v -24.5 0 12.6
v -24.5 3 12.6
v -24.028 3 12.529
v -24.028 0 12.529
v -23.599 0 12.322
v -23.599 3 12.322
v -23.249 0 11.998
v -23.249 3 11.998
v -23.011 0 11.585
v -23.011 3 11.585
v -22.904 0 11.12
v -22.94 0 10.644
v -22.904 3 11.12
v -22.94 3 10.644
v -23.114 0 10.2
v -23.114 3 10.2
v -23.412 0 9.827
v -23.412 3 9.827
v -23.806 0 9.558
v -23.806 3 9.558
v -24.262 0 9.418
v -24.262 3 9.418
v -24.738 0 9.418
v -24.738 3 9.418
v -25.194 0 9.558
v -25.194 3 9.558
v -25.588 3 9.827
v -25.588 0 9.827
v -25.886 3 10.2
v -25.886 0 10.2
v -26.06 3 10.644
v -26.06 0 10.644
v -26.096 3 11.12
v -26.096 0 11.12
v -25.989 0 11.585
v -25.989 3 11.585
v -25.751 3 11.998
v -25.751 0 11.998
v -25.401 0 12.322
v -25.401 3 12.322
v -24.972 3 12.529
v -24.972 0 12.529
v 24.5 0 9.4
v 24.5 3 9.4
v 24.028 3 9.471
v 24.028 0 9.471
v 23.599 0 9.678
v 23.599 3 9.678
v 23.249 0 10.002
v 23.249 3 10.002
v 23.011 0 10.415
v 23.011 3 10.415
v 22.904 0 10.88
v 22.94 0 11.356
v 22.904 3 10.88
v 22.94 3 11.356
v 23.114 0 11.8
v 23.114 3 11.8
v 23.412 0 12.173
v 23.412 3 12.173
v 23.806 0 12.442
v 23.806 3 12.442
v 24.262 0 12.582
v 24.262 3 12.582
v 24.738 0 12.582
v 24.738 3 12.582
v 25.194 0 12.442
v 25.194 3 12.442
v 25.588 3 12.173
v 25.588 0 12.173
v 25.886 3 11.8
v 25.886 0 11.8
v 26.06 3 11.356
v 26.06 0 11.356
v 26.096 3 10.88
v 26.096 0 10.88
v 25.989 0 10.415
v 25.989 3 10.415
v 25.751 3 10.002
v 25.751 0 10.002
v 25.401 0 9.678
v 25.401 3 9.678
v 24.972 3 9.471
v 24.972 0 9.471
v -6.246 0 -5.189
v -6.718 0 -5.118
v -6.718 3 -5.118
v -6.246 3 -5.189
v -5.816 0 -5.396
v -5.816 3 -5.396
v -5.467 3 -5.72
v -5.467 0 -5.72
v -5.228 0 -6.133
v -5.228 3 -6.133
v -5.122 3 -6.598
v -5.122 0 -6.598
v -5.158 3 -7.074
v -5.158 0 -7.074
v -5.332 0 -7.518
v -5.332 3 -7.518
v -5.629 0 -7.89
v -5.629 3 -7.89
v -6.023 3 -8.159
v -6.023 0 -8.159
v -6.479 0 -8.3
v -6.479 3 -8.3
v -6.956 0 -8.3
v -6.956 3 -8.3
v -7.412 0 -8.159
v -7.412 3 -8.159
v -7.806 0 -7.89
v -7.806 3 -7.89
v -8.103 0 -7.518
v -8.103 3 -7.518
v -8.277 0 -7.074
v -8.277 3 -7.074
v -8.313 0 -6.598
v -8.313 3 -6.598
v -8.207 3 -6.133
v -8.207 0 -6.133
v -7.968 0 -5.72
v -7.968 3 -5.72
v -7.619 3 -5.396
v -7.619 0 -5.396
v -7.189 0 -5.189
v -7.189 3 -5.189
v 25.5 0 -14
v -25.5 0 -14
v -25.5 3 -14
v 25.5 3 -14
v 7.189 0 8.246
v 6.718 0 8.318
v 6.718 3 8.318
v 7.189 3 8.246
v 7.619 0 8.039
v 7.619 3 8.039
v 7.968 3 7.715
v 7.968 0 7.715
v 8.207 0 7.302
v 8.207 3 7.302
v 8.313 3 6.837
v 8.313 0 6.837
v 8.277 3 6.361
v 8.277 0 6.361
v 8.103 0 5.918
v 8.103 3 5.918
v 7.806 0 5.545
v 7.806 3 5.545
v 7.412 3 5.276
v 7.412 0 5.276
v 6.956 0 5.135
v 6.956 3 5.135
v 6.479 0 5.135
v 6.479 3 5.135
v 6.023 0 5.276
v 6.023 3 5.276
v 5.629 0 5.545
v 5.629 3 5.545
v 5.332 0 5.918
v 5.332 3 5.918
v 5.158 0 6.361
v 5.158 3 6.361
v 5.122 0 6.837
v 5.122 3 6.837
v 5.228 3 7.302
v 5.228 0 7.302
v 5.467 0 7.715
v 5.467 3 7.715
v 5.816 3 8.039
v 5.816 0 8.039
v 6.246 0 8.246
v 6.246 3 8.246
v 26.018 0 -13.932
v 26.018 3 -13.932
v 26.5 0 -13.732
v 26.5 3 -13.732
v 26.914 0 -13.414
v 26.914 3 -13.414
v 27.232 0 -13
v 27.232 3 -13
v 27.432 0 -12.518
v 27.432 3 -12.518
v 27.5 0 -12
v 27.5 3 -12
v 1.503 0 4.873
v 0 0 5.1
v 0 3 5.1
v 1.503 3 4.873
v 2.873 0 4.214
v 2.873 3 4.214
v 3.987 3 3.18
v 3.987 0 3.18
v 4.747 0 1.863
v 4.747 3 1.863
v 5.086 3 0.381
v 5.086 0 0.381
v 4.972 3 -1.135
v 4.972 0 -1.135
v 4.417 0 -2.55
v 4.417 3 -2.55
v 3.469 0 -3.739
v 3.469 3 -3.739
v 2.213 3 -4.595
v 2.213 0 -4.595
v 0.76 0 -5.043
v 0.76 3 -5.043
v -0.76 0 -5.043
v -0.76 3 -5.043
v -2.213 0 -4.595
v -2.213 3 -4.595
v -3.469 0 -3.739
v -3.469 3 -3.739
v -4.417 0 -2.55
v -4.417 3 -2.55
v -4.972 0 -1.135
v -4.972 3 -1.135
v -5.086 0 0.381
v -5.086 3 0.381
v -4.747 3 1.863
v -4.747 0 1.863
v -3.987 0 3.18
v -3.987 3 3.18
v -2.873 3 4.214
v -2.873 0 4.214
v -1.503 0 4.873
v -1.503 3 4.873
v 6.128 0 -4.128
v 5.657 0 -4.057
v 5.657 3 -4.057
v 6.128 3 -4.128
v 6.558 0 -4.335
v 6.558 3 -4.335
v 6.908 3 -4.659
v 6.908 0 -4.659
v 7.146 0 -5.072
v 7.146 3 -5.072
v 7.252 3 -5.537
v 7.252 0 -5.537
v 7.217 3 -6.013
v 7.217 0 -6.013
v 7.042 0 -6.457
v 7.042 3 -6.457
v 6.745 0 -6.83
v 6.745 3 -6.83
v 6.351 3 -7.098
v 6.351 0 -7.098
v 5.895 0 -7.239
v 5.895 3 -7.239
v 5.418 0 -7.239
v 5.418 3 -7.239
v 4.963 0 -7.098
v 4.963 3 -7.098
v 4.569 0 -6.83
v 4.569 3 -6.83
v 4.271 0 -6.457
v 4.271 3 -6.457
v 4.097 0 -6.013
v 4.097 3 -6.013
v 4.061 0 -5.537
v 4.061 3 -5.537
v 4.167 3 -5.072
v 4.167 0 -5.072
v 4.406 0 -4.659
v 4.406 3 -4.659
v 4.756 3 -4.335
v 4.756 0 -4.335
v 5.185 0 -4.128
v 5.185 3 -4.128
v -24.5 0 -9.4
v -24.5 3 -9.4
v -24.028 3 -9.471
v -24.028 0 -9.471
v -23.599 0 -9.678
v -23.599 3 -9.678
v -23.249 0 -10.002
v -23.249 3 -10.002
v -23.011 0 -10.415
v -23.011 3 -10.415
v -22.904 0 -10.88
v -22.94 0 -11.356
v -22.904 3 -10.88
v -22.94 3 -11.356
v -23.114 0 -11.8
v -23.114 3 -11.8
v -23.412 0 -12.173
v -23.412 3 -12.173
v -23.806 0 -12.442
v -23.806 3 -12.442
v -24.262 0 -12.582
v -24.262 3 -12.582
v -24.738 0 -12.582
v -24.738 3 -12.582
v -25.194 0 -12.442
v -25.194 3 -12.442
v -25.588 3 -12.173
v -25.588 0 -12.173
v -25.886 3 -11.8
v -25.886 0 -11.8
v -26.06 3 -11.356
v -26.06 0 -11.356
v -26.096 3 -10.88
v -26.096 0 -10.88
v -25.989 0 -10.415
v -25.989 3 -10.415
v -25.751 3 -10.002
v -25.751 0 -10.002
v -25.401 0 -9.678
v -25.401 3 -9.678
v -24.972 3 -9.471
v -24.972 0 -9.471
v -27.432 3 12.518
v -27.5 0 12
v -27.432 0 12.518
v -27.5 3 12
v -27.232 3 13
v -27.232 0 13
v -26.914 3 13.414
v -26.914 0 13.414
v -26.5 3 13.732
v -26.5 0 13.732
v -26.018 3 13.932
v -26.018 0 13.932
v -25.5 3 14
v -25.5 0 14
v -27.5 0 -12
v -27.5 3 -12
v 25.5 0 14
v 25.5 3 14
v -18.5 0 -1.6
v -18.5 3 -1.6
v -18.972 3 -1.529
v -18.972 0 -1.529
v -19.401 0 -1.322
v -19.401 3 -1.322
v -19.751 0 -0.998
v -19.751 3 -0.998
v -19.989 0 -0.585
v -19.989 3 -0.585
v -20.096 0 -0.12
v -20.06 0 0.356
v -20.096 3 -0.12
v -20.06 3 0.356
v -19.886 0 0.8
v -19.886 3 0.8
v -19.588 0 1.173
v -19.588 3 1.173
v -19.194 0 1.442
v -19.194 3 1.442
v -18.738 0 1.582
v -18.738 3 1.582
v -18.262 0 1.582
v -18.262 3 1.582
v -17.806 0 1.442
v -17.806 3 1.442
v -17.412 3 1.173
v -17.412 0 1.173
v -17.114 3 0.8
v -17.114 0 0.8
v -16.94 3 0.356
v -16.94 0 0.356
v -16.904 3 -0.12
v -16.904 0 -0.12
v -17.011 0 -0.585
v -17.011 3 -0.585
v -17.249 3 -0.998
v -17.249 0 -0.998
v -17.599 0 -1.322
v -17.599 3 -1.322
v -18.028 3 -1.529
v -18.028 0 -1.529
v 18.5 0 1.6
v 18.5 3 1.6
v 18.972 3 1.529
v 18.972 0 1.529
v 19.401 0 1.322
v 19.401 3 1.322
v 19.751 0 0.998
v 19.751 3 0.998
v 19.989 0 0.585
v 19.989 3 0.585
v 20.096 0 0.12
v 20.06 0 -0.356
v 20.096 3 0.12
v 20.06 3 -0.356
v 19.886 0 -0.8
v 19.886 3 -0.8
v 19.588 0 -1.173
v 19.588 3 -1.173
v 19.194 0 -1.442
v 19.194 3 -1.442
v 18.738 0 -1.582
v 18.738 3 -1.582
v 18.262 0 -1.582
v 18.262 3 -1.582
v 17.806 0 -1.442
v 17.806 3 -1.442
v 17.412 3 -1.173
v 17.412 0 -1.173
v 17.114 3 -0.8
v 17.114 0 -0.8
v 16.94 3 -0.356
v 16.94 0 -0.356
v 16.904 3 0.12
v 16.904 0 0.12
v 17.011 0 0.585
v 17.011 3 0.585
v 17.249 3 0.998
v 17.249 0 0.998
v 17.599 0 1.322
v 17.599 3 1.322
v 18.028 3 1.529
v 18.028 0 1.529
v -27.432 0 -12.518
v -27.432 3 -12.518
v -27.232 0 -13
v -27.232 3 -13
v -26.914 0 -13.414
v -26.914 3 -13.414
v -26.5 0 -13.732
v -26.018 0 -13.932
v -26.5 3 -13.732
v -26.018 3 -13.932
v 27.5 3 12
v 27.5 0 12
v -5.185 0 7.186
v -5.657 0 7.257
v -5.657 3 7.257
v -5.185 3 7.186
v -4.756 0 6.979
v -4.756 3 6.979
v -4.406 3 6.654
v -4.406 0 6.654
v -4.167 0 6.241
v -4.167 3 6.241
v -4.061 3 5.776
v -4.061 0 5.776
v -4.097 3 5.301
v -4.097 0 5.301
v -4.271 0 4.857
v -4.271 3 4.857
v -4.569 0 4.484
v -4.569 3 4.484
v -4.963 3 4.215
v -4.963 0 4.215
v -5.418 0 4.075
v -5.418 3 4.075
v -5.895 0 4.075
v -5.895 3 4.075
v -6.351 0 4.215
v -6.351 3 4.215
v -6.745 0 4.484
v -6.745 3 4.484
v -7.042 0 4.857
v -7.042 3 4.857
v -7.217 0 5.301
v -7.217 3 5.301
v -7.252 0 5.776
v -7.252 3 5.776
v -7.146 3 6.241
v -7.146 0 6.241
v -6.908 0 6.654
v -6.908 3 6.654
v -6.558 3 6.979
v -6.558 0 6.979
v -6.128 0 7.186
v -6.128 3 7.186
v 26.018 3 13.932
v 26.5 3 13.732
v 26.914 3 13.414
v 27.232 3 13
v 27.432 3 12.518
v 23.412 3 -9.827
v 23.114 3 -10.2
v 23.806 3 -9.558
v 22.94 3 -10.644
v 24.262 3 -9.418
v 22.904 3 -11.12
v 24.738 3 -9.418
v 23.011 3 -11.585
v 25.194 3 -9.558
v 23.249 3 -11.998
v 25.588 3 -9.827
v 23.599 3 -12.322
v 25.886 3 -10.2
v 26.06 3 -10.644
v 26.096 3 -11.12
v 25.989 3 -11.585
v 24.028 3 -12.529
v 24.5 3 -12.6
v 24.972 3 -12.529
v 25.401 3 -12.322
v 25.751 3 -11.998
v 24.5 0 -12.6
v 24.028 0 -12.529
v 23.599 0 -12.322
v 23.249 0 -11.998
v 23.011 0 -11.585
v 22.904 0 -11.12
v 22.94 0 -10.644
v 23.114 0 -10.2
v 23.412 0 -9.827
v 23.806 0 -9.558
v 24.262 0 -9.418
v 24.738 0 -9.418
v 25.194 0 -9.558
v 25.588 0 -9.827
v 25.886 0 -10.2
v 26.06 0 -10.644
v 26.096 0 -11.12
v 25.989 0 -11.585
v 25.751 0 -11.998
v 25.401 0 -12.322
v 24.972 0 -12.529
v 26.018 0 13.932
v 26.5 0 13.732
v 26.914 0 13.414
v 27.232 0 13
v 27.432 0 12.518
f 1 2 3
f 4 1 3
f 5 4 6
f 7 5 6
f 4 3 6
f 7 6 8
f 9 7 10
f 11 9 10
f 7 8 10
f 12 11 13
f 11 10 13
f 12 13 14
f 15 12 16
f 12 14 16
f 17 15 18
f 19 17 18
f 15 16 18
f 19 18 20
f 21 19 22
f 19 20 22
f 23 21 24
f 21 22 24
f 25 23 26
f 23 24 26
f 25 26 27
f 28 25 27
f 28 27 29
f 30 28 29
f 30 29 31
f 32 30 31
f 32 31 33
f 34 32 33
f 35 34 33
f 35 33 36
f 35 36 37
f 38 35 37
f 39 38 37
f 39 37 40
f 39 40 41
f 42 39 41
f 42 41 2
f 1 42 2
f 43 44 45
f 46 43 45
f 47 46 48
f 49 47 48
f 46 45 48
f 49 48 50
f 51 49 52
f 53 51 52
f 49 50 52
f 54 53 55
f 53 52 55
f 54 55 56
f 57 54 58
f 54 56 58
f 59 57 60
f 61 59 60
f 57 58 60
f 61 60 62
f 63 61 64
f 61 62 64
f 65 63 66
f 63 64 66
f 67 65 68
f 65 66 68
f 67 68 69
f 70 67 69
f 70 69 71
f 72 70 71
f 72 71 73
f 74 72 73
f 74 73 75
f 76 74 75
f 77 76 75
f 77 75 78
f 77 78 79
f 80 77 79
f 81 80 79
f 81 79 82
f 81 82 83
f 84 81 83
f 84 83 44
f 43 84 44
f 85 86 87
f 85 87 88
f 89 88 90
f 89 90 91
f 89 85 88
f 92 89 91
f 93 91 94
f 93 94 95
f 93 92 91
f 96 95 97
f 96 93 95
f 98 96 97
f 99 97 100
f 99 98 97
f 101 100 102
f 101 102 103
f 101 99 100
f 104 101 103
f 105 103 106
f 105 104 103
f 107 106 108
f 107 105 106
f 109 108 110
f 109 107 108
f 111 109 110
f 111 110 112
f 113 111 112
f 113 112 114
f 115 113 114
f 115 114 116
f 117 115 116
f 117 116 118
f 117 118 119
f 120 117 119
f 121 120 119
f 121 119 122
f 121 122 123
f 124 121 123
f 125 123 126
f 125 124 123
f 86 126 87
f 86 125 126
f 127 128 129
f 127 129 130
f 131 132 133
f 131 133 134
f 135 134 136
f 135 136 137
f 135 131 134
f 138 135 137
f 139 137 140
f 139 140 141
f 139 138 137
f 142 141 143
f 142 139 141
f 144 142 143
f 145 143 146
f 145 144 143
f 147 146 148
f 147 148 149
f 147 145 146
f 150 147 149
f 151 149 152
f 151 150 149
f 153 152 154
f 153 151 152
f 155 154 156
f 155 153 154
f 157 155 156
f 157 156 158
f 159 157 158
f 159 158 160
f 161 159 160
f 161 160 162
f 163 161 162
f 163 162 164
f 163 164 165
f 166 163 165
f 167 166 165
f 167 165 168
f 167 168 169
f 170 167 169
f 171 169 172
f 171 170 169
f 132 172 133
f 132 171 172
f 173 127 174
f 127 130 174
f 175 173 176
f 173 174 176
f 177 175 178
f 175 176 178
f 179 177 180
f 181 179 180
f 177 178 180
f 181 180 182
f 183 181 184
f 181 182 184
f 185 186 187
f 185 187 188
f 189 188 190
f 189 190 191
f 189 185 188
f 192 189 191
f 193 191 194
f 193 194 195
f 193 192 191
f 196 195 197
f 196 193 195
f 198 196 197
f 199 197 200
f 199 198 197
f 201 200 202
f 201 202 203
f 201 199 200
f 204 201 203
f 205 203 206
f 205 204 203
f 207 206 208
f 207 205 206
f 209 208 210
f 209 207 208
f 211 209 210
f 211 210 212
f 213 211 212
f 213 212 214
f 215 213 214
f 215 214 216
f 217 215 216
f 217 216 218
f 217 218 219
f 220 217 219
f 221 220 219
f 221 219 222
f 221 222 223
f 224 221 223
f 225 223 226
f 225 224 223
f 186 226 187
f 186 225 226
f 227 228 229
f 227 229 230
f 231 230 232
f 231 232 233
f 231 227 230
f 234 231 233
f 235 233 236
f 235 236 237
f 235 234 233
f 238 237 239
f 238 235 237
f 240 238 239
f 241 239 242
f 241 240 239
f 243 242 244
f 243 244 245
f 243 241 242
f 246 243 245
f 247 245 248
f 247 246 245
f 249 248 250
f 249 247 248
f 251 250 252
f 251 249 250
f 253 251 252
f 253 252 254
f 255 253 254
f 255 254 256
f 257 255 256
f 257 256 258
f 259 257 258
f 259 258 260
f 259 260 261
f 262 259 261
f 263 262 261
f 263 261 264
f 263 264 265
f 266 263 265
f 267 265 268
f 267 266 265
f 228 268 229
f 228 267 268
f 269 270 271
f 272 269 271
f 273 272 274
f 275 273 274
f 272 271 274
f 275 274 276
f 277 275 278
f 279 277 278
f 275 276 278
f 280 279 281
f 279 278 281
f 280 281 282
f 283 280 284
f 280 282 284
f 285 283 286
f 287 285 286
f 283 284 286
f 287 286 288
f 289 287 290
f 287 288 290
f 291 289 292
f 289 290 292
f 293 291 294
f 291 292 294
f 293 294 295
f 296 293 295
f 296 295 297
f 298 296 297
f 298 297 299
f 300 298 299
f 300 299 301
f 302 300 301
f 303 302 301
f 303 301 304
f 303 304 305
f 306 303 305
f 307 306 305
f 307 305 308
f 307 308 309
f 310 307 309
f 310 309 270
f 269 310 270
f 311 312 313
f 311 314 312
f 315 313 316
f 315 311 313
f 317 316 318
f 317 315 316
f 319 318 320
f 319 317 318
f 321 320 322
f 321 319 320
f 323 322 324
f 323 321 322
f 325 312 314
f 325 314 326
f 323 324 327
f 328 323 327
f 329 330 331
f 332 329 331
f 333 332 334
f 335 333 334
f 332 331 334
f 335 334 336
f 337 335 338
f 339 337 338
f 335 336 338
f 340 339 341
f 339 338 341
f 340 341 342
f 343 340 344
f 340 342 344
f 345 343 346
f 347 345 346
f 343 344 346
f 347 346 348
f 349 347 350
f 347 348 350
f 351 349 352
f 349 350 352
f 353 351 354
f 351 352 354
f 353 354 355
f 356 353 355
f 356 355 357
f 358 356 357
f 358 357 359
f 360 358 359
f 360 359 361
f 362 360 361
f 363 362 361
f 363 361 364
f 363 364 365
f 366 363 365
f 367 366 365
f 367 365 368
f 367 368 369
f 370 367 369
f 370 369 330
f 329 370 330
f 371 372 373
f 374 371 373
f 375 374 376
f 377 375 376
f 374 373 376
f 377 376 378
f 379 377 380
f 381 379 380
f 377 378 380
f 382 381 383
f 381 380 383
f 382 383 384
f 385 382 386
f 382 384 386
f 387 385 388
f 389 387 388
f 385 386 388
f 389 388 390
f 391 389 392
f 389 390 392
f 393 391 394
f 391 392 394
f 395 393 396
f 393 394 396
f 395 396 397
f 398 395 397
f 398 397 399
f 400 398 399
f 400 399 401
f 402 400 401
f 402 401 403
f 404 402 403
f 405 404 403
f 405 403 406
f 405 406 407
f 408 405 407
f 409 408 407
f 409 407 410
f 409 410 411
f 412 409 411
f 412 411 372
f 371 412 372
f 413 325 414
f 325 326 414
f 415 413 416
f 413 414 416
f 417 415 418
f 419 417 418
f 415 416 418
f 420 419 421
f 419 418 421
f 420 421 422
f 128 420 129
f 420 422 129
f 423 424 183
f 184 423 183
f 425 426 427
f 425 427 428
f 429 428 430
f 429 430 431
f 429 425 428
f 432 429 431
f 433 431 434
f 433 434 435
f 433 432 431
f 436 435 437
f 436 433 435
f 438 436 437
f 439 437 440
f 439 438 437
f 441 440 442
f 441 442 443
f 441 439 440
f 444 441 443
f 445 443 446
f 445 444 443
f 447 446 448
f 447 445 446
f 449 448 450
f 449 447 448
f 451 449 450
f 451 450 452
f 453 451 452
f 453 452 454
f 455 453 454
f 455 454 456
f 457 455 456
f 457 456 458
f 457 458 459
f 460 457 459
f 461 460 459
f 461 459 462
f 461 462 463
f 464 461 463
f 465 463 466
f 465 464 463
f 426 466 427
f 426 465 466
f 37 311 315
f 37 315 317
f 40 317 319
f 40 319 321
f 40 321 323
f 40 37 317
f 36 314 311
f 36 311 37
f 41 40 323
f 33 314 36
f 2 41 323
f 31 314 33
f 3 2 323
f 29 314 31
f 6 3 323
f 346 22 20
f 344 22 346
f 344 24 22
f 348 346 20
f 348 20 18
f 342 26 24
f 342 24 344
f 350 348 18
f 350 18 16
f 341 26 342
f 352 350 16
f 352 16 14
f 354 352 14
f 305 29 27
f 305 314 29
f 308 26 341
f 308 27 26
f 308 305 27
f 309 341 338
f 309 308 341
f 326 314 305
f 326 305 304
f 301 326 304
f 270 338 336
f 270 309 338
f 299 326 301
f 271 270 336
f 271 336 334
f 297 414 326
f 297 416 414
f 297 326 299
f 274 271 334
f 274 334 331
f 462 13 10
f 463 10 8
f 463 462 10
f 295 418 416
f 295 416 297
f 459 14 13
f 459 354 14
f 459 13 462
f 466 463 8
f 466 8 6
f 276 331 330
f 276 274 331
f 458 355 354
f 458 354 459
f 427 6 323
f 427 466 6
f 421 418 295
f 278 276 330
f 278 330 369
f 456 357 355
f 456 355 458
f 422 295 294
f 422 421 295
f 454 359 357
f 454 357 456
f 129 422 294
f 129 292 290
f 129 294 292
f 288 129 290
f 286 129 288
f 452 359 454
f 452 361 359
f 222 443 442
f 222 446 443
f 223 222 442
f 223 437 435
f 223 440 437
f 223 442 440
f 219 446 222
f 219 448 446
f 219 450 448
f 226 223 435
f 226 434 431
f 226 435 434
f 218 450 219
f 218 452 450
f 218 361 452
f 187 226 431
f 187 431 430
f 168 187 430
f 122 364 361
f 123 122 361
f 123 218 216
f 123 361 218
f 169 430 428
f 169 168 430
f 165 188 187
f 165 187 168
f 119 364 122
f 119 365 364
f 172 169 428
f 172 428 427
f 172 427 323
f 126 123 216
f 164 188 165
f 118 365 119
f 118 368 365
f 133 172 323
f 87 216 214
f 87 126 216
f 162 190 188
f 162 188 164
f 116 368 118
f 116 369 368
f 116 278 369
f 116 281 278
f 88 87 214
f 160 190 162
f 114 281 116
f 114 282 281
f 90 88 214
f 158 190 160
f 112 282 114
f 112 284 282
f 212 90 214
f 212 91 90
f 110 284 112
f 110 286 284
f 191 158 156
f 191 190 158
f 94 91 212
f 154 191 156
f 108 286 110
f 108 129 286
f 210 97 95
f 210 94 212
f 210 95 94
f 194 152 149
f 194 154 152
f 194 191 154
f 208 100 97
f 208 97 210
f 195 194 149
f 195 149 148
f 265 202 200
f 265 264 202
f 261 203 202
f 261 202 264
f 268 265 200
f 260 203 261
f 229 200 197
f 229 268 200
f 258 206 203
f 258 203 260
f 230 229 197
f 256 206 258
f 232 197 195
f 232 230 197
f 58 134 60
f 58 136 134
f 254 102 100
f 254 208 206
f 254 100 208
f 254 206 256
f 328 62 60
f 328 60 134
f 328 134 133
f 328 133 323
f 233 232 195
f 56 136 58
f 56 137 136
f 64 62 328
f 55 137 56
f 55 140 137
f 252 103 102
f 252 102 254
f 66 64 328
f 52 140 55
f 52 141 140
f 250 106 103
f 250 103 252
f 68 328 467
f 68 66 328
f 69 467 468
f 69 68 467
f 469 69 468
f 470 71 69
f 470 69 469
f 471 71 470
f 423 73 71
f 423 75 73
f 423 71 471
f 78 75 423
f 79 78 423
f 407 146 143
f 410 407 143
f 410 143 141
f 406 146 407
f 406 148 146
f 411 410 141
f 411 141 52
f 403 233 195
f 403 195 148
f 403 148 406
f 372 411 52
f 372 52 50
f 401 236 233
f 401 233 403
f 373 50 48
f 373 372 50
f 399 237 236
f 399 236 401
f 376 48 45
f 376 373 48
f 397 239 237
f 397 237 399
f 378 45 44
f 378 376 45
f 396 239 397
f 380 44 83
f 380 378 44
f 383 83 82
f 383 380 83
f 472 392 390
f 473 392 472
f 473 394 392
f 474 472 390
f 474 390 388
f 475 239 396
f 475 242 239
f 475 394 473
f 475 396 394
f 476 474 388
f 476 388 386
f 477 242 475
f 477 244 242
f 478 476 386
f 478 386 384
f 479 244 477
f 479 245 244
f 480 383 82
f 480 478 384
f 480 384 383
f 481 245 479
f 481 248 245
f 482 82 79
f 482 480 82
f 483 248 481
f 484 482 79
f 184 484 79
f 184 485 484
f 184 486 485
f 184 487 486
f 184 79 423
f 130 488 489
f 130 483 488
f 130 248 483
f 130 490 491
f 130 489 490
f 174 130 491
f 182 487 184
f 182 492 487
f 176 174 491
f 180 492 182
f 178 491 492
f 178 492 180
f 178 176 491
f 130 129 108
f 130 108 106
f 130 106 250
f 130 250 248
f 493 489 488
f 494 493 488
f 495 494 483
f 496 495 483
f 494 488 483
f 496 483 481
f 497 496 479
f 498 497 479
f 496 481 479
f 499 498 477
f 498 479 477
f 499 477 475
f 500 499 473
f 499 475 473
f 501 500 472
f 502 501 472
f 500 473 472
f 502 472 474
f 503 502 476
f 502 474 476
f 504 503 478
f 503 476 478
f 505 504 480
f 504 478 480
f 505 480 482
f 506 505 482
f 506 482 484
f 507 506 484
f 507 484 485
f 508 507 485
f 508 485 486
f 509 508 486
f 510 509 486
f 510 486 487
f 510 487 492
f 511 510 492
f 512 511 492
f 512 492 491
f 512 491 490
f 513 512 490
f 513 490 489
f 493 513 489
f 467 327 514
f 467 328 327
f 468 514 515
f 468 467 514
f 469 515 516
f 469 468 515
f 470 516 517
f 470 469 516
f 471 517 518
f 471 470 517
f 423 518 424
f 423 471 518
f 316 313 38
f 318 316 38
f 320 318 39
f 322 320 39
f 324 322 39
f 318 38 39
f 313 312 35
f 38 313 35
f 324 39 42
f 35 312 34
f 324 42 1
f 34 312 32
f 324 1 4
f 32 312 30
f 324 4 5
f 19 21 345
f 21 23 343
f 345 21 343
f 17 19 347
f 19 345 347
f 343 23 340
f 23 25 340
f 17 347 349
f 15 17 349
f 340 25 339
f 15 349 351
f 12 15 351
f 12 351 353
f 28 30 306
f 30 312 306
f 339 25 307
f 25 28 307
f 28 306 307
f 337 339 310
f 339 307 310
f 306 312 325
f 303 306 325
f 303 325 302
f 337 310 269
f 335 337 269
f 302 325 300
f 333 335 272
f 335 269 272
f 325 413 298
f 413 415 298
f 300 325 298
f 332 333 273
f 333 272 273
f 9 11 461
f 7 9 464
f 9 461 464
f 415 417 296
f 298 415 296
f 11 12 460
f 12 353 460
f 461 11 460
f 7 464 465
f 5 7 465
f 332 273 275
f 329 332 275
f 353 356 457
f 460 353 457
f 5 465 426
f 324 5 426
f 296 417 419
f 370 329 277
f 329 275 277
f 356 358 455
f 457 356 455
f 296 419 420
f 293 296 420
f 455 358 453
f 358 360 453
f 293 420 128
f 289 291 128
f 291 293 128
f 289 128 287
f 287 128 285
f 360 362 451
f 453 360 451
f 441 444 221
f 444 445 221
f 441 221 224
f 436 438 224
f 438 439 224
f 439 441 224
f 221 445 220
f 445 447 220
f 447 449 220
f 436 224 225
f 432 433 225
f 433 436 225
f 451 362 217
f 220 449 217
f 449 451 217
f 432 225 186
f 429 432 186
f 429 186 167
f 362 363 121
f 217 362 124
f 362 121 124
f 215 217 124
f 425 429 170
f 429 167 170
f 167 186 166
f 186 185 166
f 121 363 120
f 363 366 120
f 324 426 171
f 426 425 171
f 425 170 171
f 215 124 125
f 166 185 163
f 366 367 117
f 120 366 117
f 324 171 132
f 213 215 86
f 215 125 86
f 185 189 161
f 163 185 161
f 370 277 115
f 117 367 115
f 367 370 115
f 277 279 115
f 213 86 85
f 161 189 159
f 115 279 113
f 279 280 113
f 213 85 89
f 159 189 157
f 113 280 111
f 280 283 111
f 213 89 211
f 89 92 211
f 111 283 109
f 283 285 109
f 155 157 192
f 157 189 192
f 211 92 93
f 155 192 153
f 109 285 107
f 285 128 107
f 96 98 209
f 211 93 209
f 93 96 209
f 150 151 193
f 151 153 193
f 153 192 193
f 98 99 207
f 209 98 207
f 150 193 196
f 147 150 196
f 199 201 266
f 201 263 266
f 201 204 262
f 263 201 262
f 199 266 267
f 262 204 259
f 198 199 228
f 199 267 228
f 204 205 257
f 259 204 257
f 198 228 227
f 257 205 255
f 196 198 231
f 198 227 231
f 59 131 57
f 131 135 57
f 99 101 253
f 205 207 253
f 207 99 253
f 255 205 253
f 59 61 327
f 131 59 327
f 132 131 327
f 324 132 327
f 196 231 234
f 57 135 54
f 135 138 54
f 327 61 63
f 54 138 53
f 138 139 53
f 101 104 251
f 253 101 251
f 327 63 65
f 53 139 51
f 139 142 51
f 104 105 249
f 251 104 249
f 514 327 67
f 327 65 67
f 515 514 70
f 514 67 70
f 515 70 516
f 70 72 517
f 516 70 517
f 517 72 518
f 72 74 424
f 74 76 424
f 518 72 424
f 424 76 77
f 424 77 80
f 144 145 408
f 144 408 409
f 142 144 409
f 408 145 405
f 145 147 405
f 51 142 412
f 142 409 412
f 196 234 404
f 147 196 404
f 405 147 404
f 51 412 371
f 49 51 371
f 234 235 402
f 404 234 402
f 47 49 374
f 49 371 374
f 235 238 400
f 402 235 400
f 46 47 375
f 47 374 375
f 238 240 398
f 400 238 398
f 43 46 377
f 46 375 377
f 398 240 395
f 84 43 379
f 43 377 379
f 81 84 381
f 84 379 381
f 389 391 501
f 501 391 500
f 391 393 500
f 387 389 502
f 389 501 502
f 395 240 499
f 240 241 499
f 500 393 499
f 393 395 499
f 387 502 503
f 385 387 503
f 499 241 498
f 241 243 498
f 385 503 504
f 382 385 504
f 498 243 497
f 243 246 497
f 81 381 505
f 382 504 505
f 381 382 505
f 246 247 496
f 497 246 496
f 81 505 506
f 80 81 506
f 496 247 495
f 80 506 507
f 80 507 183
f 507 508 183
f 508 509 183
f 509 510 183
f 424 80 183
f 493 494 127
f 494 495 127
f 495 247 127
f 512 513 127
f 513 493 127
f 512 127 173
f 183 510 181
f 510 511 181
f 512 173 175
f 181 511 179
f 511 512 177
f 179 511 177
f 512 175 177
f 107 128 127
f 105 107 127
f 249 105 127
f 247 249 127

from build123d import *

# Parameters (mm, degrees)
SKETCH_1_W          = 55
SKETCH_1_H          = 28
SKETCH_1_R          = 5.1
SKETCH_1_R_2        = 1.6
EXTRUDE_1_DEPTH     = 3
SKETCH_2_R          = 1.6
CUT_EXTRUDE_1_DEPTH = 32.004031996
FILLET_1_R          = 2


with BuildPart() as part:
    # 草图1 → 凸台-拉伸1 (new body)
    with BuildSketch(Plane(origin=(0, 0, 0), x_dir=(1, 0, 0), z_dir=(0, 1, 0))):
        Rectangle(SKETCH_1_W, SKETCH_1_H)
        with Locations(Location((0, 0, 0), (0, 0, 270))):
            Circle(SKETCH_1_R, mode=Mode.SUBTRACT)
        with Locations(Location((5.656854249, 5.656854249, 0), (0, 0, 270))):
            Circle(SKETCH_1_R_2, mode=Mode.SUBTRACT)
        with Locations(Location((-5.656854249, -5.656854249, 0), (0, 0, 270))):
            Circle(SKETCH_1_R_2, mode=Mode.SUBTRACT)
        with Locations(Location((6.717514421, -6.717514421, 0), (0, 0, 270))):
            Circle(SKETCH_1_R_2, mode=Mode.SUBTRACT)
        with Locations(Location((-6.717514421, 6.717514421, 0), (0, 0, 270))):
            Circle(SKETCH_1_R_2, mode=Mode.SUBTRACT)
    extrude(amount=EXTRUDE_1_DEPTH)

    # 草图2 → 切除-拉伸1 (cut, through all)
    with BuildSketch(Plane(origin=(0, 3, 0), x_dir=(1, 0, 0), z_dir=(0, 1, 0))):
        with Locations(Location((-24.5, 11, 0), (0, 0, 270))):
            Circle(SKETCH_2_R)
        with Locations(Location((-24.5, -11, 0), (0, 0, 270))):
            Circle(SKETCH_2_R)
        with Locations(Location((24.5, 11, 0), (0, 0, 90))):
            Circle(SKETCH_2_R)
        with Locations(Location((24.5, -11, 0), (0, 0, 90))):
            Circle(SKETCH_2_R)
        with Locations((422.703102168, 0)):
            Circle(SKETCH_2_R)
        with Locations(Location((18.5, 0, 0), (0, 0, 270))):
            Circle(SKETCH_2_R)
        with Locations(Location((-18.5, 0, 0), (0, 0, 90))):
            Circle(SKETCH_2_R)
    extrude(amount=-CUT_EXTRUDE_1_DEPTH, mode=Mode.SUBTRACT)

    # 圆角1
    fillet_1_edges = [part.edges().sort_by_distance(p)[0] for p in [
        (27.5, 1.5, 14),
        (-27.5, 1.5, 14),
        (-27.5, 1.5, -14),
        (27.5, 1.5, -14),
    ]]
    fillet(fillet_1_edges, radius=FILLET_1_R)


solid = part.part
